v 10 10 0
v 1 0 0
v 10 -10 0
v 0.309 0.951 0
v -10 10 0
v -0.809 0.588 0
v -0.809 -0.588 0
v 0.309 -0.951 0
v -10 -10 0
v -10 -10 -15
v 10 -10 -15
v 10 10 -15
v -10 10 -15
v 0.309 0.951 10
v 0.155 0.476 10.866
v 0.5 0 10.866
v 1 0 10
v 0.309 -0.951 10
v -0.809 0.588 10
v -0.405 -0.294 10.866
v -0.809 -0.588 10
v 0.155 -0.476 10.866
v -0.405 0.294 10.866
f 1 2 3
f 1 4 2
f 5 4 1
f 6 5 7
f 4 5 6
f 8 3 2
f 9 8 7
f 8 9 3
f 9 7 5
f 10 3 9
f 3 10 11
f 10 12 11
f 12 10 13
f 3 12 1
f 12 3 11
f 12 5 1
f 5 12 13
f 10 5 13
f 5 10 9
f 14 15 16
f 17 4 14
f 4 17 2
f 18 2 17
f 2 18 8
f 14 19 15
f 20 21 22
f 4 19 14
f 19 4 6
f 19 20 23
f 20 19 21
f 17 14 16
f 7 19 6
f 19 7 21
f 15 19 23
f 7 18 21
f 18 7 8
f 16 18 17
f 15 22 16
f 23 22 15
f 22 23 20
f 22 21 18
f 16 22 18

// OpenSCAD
CubeFaces = [
  [0,1,2,3],  // bottom
  [4,5,1,0],  // front
  [7,6,5,4],  // top
  [5,6,2,1],  // right
  [6,7,3,2],  // back
  [7,4,0,3]]; // left

L=10;

dir_vect = [0,0,1];
perpX = [dir_vect[2], 0, -dir_vect[0]];
perpY = [
  -dir_vect[0]*dir_vect[1],
  pow(dir_vect[0],2)+pow(dir_vect[2],2),
  -dir_vect[1]*dir_vect[2]
];
CubePoints = [
  -L*perpX - L*perpY,
  L*perpX - L*perpY, 
  L*perpX + L*perpY,
  -L*perpX + L*perpY,
  -L*perpX - L*perpY - 1.5*L*dir_vect,
  L*perpX - L*perpY - 1.5*L*dir_vect, 
  L*perpX + L*perpY - 1.5*L*dir_vect,
  -L*perpX + L*perpY - 1.5*L*dir_vect
];

echo ("CubePoints:", CubePoints);
polyhedron (
  points = CubePoints,
  faces = CubeFaces
);
hull () {
    sphere (1);
    translate (dir_vect*L) sphere (1);
}
